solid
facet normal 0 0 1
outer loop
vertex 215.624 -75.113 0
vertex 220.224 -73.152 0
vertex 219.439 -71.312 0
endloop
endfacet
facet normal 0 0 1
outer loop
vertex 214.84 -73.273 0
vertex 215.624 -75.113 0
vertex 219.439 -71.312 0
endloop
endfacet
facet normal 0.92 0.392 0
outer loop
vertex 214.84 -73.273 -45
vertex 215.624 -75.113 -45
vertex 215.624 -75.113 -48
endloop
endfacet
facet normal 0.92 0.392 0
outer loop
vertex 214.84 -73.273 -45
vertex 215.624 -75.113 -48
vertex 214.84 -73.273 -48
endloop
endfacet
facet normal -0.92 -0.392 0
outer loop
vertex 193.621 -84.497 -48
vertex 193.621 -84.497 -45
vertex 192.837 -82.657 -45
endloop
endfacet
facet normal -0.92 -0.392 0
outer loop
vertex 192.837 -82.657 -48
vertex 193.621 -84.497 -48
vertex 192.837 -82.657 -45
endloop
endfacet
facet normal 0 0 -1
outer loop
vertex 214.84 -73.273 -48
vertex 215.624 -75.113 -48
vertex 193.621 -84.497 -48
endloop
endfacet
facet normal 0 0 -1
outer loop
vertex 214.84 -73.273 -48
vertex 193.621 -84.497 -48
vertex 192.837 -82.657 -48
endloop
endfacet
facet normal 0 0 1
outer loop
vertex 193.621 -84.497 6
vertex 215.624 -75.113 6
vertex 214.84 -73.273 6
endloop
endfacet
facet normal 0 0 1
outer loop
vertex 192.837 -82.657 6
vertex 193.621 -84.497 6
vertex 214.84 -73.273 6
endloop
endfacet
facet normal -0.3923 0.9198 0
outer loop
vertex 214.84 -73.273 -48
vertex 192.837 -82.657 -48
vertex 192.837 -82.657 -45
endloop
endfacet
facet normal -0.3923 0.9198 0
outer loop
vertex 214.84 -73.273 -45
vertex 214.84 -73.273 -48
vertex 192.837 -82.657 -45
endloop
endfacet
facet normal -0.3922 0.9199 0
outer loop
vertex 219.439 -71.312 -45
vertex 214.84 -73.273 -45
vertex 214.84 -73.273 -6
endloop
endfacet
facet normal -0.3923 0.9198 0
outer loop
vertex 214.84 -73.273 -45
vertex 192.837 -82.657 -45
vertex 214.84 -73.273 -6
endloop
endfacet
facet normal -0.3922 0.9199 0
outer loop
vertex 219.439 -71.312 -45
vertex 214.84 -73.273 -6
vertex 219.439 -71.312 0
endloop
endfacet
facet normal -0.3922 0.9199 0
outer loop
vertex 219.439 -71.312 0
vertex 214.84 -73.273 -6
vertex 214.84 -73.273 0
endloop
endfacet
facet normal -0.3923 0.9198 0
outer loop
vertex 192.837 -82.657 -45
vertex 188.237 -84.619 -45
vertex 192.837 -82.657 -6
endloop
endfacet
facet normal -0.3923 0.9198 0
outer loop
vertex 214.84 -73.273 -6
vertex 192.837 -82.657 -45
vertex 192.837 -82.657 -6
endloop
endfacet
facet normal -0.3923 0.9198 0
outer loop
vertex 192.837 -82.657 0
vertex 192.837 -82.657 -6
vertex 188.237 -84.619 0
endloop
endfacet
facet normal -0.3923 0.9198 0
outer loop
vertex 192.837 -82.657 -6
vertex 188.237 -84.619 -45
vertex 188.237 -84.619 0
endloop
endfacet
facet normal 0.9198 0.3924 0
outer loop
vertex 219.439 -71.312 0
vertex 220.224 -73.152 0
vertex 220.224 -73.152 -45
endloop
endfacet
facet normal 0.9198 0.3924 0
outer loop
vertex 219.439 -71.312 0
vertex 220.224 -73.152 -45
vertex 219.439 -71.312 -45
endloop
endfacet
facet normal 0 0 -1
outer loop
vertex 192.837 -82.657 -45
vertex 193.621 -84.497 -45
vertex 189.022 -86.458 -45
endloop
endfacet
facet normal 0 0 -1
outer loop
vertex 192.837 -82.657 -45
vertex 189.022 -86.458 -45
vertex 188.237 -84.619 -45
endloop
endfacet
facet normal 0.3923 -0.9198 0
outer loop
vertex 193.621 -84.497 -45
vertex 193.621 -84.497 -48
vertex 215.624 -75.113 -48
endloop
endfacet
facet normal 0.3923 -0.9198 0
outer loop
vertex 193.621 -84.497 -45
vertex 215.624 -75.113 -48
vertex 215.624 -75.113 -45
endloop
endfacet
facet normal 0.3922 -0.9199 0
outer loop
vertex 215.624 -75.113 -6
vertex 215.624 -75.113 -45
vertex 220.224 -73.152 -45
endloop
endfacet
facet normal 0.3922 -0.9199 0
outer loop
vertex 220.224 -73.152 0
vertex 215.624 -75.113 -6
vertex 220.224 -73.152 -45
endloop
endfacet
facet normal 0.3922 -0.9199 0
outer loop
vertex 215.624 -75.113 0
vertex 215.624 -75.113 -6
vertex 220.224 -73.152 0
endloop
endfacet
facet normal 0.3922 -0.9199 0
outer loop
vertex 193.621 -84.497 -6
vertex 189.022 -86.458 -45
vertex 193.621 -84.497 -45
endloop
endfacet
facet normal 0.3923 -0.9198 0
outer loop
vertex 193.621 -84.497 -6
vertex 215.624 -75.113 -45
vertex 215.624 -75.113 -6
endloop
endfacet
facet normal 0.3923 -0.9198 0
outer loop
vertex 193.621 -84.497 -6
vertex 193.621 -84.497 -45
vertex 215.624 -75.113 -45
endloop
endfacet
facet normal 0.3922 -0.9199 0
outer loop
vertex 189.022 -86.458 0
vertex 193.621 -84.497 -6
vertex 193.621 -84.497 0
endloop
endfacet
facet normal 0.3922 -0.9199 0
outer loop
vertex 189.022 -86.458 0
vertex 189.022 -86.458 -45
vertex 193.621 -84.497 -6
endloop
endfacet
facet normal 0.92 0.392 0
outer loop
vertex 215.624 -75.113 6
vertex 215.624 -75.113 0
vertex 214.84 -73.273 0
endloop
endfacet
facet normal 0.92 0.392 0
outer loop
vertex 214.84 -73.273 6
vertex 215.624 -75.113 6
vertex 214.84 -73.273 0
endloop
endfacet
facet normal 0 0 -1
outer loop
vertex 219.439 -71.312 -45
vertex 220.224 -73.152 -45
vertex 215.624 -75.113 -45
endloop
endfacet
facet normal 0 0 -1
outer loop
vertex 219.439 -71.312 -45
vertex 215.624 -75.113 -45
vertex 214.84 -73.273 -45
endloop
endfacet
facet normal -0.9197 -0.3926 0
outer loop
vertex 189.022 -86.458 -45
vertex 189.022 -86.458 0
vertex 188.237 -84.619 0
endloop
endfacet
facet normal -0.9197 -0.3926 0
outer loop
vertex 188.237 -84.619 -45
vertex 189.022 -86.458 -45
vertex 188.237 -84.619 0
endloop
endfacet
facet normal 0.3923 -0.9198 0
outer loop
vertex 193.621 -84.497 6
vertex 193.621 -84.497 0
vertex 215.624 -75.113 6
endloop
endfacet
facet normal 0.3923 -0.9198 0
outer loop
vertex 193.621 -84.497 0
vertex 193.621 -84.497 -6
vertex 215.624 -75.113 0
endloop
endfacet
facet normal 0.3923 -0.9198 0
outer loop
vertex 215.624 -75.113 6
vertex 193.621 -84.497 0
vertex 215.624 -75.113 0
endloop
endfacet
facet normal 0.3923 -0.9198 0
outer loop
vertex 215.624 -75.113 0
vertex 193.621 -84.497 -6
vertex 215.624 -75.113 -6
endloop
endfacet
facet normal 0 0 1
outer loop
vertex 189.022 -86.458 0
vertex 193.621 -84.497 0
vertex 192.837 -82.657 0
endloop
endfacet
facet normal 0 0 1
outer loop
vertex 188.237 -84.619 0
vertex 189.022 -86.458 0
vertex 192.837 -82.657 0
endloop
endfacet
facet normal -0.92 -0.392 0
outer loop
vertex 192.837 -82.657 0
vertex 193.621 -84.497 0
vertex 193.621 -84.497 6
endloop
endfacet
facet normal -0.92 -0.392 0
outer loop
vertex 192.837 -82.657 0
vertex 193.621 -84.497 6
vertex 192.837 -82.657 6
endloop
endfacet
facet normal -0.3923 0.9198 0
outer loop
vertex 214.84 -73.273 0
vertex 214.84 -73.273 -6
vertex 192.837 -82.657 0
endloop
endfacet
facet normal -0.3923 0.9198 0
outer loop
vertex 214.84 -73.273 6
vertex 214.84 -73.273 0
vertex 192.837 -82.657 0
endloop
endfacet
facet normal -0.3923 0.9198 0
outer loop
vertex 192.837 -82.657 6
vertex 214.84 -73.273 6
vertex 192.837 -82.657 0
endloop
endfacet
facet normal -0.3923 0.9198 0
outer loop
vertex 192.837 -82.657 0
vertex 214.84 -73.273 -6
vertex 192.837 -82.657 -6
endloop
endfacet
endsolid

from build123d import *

# Parameters (mm, degrees)
ESTRUSIONE_ESTRUSIONE1_DEPTH      = 48
ESTRUSIONE_ESTRUSIONE1_DEPTH_BACK = 6
SCHIZZO2_W                        = 45
SCHIZZO2_H                        = 2
ESTRUSIONE_ESTRUSIONE2_DEPTH      = 5
CORPO_SPOSTA_COPIA1_START         = 139.953637561
CORPO_SPOSTA_COPIA1_OUTLINE_W     = 2
CORPO_SPOSTA_COPIA1_OUTLINE_H     = 42
CORPO_SPOSTA_COPIA1_DEPTH         = 33.920640211
CORPO_SPOSTA_COPIA1_2_OUTLINE_W   = 2
CORPO_SPOSTA_COPIA1_2_OUTLINE_H   = 6
CORPO_SPOSTA_COPIA1_2_DEPTH       = 5
CORPO_SPOSTA_COPIA1_START_2       = 168.874277772
CORPO_SPOSTA_COPIA1_3_OUTLINE_W   = 2
CORPO_SPOSTA_COPIA1_3_OUTLINE_H   = 6
CORPO_SPOSTA_COPIA1_3_DEPTH       = 5
CORPO_SPOSTA_COPIA1_4_OUTLINE_W   = 2
CORPO_SPOSTA_COPIA1_4_OUTLINE_H   = 45
CORPO_SPOSTA_COPIA1_4_DEPTH       = 33.920640211
CORPO_SPOSTA_COPIA1_START_3       = 144.953637561
CORPO_SPOSTA_COPIA1_5_OUTLINE_W   = 2
CORPO_SPOSTA_COPIA1_5_OUTLINE_H   = 3
CORPO_SPOSTA_COPIA1_5_DEPTH       = 23.920640211


# Read off the part's stored shape, not the designer's step: Corpo-Sposta/copia1
with BuildPart() as part:
    # Schizzo1 → Estrusione-Estrusione1 (new, two sides: drawn at the far end of the back side and taken through both)
    with BuildSketch(Plane.XY.offset(-ESTRUSIONE_ESTRUSIONE1_DEPTH_BACK)):
        Polygon((214.839776844, -73.273463404), (192.836567017, -82.657267824), (193.62114505, -84.496951848), (215.624354877, -75.113147429), align=None)
    extrude(amount=ESTRUSIONE_ESTRUSIONE1_DEPTH + ESTRUSIONE_ESTRUSIONE1_DEPTH_BACK)

    # Schizzo2 → Estrusione-Estrusione2 (add)
    with BuildSketch(Plane(origin=(155.337655494, 66.24752432, 0), x_dir=(0, 0, -1), z_dir=(0.919842012316021, 0.39228901638767966, 0))):
        with Locations((-22.5, -152.679294766)):
            Rectangle(SCHIZZO2_W, SCHIZZO2_H)
    estrusione_estrusione2 = extrude(amount=ESTRUSIONE_ESTRUSIONE2_DEPTH)

    # Specchia1: Estrusione-Estrusione2 across plane
    add(estrusione_estrusione2.mirror(Plane(origin=(144.33605058, 61.55562211, 0), x_dir=(0, 0, 1), z_dir=(0.9198420123160211, 0.3922890163876793, 0))))

    # Corpo-Sposta/copia1 outline → Corpo-Sposta/copia1 (cut)
    with BuildSketch(Plane(origin=(0, 0, 0), x_dir=(-0.39228901638766717, 0.9198420123160262, 0), z_dir=(0.9198420123160264, 0.3922890163876671, 0)).offset(CORPO_SPOSTA_COPIA1_START)):
        with Locations((-152.679294766, 27)):
            Rectangle(CORPO_SPOSTA_COPIA1_OUTLINE_W, CORPO_SPOSTA_COPIA1_OUTLINE_H)
    extrude(amount=CORPO_SPOSTA_COPIA1_DEPTH, mode=Mode.SUBTRACT)

    # Corpo-Sposta_copia1 2 outline → Corpo-Sposta_copia1 2 (cut)
    with BuildSketch(Plane(origin=(0, 0, 0), x_dir=(-0.39228901638766717, 0.9198420123160262, 0), z_dir=(0.9198420123160264, 0.3922890163876671, 0)).offset(CORPO_SPOSTA_COPIA1_START)):
        with Locations((-152.679294766, 3)):
            Rectangle(CORPO_SPOSTA_COPIA1_2_OUTLINE_W, CORPO_SPOSTA_COPIA1_2_OUTLINE_H)
    extrude(amount=CORPO_SPOSTA_COPIA1_2_DEPTH, mode=Mode.SUBTRACT)

    # Corpo-Sposta_copia1 3 outline → Corpo-Sposta_copia1 3 (cut)
    with BuildSketch(Plane(origin=(0, 0, 0), x_dir=(-0.39228901638766717, 0.9198420123160262, 0), z_dir=(0.9198420123160264, 0.3922890163876671, 0)).offset(CORPO_SPOSTA_COPIA1_START_2)):
        with Locations((-152.679294766, 3)):
            Rectangle(CORPO_SPOSTA_COPIA1_3_OUTLINE_W, CORPO_SPOSTA_COPIA1_3_OUTLINE_H)
    extrude(amount=CORPO_SPOSTA_COPIA1_3_DEPTH, mode=Mode.SUBTRACT)

    # Corpo-Sposta_copia1 4 outline → Corpo-Sposta_copia1 4 (add)
    with BuildSketch(Plane(origin=(0, 0, 0), x_dir=(-0.39228901638766717, 0.9198420123160262, 0), z_dir=(0.9198420123160264, 0.3922890163876671, 0)).offset(CORPO_SPOSTA_COPIA1_START)):
        with Locations((-152.679294766, -22.5)):
            Rectangle(CORPO_SPOSTA_COPIA1_4_OUTLINE_W, CORPO_SPOSTA_COPIA1_4_OUTLINE_H)
    extrude(amount=CORPO_SPOSTA_COPIA1_4_DEPTH)

    # Corpo-Sposta_copia1 5 outline → Corpo-Sposta_copia1 5 (add)
    with BuildSketch(Plane(origin=(0, 0, 0), x_dir=(-0.39228901638766717, 0.9198420123160262, 0), z_dir=(0.9198420123160264, 0.3922890163876671, 0)).offset(CORPO_SPOSTA_COPIA1_START_3)):
        with Locations((-152.679294766, -46.5)):
            Rectangle(CORPO_SPOSTA_COPIA1_5_OUTLINE_W, CORPO_SPOSTA_COPIA1_5_OUTLINE_H)
    extrude(amount=CORPO_SPOSTA_COPIA1_5_DEPTH)


solid = part.part
